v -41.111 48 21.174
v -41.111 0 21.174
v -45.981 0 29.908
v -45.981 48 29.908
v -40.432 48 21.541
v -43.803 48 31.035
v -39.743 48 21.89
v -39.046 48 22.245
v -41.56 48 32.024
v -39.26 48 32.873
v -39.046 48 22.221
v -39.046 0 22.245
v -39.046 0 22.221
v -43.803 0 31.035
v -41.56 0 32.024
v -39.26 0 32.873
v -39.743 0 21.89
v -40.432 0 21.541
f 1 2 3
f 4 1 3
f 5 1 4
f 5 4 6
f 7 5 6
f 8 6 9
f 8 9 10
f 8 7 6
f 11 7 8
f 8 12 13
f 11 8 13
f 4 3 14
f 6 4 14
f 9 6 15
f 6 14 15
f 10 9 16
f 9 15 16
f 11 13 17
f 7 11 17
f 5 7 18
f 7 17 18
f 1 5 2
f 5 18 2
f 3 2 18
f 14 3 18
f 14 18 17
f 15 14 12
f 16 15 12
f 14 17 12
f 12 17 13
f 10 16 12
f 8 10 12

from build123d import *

# Parameters (mm, degrees)
BOSS_EXTRUDE1_DEPTH = 48


with BuildPart() as part:
    # Sketch1 → Boss-Extrude1 (new body)
    with BuildSketch(Plane(origin=(0, 0, 0), x_dir=(0.9999530758491465, 0, -0.009687419668383268), z_dir=(0, 1, 0))):
        with BuildLine():
            Line((-41.314383982, -20.77443632), (-46.26820393, -29.461156439))
            ThreePointArc((-46.26820393, -29.461156439), (-42.993051469, -31.13201524), (-39.576799535, -32.491285451))
            Line((-39.576799535, -32.491285451), (-39.2598183, -21.865759848))
            Line((-39.2598183, -21.865759848), (-39.2591075, -21.841933141))
            ThreePointArc((-39.2591075, -21.841933141), (-40.297217765, -21.328346763), (-41.314383982, -20.77443632))
        make_face()
    extrude(amount=BOSS_EXTRUDE1_DEPTH)


solid = part.part
